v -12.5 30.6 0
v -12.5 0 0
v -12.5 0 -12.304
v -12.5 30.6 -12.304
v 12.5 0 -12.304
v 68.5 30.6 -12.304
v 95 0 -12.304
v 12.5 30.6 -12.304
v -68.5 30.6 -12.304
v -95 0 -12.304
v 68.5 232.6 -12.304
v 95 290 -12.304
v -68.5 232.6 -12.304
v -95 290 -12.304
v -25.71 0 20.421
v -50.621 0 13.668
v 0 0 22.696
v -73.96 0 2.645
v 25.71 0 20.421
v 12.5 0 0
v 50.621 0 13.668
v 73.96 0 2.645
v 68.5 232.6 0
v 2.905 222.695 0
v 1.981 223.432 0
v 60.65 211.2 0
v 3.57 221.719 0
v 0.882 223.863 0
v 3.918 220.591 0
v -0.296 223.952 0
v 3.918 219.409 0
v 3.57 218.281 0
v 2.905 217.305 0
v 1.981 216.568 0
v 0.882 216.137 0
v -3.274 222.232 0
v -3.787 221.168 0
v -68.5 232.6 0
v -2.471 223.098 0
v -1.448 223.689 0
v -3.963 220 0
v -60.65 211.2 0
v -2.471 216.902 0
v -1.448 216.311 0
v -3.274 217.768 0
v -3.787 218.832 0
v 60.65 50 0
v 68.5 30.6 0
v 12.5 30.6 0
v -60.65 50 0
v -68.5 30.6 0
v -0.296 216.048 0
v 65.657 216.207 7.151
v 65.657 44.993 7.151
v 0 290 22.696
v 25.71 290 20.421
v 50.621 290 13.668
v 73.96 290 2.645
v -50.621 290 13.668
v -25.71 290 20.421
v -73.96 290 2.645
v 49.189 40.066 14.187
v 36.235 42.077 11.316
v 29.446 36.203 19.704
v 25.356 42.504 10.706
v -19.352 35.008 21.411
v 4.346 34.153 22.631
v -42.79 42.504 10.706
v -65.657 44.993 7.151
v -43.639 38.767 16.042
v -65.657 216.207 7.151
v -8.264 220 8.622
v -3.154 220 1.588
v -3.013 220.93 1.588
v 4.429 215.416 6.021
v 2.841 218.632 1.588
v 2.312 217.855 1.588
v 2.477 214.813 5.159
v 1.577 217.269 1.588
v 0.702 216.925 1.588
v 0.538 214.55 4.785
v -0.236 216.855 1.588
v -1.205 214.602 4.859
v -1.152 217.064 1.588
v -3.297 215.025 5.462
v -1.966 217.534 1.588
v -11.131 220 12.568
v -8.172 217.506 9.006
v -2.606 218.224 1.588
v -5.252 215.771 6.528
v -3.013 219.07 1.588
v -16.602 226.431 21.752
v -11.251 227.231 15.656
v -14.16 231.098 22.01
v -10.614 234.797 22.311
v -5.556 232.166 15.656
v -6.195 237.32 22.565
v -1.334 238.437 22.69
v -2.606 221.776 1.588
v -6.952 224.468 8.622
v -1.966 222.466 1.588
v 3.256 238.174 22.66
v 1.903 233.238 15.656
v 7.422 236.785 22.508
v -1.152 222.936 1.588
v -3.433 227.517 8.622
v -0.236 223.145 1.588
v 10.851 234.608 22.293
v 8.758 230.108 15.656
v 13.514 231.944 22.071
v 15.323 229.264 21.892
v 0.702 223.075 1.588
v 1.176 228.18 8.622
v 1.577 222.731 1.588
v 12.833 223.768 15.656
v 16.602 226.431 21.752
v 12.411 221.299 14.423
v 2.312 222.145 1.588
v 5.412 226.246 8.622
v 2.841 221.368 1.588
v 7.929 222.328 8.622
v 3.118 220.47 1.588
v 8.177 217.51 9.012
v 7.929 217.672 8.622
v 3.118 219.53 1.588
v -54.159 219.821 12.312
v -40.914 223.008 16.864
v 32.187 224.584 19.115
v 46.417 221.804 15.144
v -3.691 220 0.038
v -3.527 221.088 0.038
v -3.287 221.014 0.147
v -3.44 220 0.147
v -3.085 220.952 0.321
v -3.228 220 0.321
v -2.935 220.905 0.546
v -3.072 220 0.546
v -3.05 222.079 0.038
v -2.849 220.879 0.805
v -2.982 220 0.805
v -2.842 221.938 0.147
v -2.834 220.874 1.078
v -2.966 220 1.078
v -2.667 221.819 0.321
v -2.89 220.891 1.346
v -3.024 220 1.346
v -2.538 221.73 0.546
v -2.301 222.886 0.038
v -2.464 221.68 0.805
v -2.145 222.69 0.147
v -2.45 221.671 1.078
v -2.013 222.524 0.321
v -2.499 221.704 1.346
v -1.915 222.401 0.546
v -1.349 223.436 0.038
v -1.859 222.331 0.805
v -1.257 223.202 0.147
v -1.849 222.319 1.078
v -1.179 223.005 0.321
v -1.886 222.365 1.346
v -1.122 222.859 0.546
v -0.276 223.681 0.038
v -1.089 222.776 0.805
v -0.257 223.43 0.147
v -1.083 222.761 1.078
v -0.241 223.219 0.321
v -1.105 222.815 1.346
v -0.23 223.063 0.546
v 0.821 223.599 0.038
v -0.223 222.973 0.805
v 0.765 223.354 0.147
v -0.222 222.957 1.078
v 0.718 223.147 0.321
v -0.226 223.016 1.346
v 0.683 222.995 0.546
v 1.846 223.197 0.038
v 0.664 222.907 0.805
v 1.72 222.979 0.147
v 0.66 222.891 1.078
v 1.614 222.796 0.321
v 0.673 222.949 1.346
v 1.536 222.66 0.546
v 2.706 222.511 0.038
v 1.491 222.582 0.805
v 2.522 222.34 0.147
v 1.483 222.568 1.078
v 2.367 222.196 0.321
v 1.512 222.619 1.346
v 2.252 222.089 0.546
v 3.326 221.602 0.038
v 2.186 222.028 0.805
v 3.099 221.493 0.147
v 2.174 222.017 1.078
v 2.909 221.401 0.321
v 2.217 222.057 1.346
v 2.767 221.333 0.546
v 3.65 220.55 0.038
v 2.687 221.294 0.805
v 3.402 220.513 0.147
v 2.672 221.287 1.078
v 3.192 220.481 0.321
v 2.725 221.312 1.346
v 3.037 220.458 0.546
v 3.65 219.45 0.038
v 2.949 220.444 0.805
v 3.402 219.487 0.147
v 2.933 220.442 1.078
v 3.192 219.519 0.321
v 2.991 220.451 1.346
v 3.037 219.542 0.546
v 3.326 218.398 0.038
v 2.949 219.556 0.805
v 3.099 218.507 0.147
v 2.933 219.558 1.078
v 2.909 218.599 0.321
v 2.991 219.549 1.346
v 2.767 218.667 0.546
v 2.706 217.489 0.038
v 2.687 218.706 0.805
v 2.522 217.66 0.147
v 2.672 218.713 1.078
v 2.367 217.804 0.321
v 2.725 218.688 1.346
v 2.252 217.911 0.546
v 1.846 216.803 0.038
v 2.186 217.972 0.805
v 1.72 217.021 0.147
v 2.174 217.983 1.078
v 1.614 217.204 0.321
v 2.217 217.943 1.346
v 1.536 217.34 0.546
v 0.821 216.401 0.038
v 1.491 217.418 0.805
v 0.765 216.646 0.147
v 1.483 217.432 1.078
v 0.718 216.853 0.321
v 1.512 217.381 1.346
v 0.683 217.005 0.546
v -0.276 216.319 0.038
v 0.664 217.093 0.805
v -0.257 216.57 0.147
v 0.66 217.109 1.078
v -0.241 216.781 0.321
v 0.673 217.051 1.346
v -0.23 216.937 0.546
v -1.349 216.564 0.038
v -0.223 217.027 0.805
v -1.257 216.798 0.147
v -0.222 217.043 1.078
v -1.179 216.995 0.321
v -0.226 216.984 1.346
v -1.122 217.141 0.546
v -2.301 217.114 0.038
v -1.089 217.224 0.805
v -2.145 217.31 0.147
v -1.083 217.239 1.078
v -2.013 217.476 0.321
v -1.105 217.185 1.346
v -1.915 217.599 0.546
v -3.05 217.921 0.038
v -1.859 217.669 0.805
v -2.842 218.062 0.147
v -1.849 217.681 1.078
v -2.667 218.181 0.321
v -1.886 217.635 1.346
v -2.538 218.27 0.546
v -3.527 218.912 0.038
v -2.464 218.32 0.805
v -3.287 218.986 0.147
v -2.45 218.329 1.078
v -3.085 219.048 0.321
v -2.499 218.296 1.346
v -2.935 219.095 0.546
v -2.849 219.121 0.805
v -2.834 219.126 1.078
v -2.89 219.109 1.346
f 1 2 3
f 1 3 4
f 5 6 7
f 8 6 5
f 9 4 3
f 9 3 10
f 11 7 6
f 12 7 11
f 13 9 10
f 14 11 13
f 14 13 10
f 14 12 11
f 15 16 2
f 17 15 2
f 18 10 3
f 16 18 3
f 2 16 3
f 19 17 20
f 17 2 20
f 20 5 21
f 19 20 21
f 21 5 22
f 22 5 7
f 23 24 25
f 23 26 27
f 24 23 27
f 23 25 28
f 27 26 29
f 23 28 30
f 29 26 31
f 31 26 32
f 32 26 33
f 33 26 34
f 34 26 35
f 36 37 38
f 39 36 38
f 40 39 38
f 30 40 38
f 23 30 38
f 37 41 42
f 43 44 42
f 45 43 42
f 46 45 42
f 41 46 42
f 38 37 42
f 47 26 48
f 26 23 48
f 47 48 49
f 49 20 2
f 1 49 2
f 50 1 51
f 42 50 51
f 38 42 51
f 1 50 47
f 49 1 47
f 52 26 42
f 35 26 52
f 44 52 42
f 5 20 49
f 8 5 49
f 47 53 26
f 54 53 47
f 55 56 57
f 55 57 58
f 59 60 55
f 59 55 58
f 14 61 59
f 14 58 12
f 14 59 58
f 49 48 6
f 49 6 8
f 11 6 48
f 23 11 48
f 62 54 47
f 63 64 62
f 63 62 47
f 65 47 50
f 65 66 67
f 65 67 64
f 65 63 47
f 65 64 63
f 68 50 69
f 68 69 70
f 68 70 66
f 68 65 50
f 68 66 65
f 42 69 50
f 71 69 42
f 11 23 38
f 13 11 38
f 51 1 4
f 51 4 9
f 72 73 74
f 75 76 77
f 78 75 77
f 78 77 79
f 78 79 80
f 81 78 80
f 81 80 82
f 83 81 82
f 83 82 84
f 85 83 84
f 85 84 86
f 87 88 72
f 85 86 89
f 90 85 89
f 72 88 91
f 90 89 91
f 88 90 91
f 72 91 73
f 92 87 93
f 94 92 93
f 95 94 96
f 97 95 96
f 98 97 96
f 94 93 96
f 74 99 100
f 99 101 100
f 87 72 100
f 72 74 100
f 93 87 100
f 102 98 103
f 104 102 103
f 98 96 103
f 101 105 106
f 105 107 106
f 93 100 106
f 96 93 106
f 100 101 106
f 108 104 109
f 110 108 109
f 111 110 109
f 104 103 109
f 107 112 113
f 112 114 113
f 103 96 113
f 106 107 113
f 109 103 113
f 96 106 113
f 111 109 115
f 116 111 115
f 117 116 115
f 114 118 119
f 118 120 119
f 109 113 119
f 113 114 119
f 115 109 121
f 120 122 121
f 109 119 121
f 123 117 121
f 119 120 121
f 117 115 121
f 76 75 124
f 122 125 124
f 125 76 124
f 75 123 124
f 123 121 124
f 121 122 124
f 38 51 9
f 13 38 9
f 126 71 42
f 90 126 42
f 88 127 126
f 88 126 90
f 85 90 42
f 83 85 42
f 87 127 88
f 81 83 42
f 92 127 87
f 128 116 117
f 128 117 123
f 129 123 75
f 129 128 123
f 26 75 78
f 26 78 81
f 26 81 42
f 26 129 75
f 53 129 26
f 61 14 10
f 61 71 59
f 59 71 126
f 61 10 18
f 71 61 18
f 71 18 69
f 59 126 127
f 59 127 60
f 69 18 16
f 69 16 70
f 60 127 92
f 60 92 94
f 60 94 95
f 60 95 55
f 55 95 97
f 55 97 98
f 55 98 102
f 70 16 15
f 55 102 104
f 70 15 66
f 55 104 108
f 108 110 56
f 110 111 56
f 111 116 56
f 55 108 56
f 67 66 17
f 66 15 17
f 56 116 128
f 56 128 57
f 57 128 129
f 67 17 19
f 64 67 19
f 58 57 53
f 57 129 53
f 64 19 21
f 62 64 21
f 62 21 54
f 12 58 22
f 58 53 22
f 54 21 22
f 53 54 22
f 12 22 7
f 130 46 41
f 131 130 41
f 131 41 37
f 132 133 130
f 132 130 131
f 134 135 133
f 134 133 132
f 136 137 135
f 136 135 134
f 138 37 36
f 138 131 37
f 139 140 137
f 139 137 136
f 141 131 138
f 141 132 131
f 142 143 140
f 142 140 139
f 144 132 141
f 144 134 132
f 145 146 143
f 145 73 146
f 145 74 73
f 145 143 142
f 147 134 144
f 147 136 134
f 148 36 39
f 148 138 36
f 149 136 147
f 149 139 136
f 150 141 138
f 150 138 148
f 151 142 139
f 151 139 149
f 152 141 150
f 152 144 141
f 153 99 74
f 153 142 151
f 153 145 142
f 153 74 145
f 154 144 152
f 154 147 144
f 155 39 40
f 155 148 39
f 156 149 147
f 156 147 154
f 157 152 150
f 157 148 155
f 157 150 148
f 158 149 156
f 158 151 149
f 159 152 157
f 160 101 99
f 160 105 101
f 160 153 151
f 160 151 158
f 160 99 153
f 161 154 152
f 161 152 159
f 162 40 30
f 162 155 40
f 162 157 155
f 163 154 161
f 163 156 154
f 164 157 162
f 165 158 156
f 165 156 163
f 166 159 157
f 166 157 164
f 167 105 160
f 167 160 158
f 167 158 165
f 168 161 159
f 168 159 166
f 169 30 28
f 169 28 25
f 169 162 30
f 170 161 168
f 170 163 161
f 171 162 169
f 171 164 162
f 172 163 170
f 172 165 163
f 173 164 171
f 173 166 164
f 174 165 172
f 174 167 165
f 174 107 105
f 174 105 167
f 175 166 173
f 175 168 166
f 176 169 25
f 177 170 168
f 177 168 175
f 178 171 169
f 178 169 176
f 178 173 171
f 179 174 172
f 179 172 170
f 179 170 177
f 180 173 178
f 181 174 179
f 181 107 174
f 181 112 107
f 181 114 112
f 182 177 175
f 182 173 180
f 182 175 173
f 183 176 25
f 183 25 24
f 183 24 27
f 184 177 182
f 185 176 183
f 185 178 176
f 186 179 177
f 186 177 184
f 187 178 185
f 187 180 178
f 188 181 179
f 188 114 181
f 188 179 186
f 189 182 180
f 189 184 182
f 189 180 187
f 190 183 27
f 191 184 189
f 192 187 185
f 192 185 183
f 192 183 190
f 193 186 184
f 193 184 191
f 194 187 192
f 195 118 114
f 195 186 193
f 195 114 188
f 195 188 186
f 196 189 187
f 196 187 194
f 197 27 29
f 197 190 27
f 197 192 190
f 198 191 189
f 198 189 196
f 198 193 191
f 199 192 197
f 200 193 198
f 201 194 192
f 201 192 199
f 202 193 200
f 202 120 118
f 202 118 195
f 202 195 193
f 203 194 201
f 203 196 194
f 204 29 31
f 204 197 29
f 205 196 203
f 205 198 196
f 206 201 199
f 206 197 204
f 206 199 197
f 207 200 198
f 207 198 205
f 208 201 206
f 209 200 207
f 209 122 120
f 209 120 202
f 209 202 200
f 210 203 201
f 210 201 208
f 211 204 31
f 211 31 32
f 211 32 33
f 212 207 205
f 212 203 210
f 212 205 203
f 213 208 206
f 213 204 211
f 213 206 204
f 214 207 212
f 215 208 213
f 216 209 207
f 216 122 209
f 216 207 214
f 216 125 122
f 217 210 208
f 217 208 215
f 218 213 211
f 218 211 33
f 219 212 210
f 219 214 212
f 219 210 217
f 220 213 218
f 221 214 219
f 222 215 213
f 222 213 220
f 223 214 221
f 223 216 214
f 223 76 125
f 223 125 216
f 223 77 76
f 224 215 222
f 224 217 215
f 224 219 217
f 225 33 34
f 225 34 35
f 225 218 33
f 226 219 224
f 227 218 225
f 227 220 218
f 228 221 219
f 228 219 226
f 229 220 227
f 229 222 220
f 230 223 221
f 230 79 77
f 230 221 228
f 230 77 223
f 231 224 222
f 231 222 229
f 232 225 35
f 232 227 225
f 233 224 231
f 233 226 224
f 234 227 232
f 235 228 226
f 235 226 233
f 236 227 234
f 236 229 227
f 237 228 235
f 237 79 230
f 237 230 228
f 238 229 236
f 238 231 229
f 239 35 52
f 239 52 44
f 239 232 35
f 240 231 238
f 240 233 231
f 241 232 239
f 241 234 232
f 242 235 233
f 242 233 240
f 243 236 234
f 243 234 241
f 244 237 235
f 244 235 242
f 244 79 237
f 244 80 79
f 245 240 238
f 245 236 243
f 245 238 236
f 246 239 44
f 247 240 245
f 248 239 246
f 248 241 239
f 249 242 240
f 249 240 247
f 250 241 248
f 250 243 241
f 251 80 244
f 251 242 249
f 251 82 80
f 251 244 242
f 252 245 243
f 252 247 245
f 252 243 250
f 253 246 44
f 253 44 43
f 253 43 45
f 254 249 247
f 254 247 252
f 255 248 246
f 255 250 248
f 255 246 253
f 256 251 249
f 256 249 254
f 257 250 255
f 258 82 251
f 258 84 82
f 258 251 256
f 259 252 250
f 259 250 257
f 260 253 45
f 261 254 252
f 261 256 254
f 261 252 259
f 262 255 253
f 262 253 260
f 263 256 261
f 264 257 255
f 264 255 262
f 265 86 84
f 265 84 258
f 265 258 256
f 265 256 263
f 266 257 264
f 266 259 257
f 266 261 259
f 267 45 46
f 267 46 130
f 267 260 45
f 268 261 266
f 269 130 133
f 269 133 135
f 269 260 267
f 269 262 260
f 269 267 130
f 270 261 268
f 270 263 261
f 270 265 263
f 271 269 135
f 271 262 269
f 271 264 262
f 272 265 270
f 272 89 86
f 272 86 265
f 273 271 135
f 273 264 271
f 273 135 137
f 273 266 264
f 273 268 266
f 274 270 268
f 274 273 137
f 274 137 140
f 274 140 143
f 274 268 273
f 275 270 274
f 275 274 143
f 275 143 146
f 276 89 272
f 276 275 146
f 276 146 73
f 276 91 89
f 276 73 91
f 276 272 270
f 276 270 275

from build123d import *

# Parameters (mm, degrees)
BOSS_EXTRUDE1_DEPTH = 290
SKETCH3_W           = 137
SKETCH3_H           = 57.4
SKETCH3_W_2         = 56
SKETCH3_H_2         = 30.6
BOSS_EXTRUDE2_DEPTH = 12.30416804
SKETCH3_3_W         = 121.3
SKETCH3_3_H         = 161.2
CUT_EXTRUDE1_DEPTH  = 307.006700561
CUT_EXTRUDE1_TAPER  = -35
SKETCH3_5_R         = 2
CUT_EXTRUDE2_DEPTH  = 307.006700694
CUT_EXTRUDE2_DRAFT  = 36
FILLET2_R           = 1


with BuildPart() as part:
    # Sketch1 → Boss-Extrude1 (new body)
    with BuildSketch(Plane(origin=(0, 0, 0), x_dir=(1, 0, 0), z_dir=(0, 1, 0))):
        with BuildLine():
            Line((0, 0), (-68.5, 0))
            Line((-68.5, 0), (-68.5, 7.5))
            Line((-68.5, 7.5), (-68.5, 12.30416804))
            Line((-68.5, 12.30416804), (-95, 12.30416804))
            ThreePointArc((-95, 12.30416804), (0, -22.69583196), (95, 12.30416804))
            Line((95, 12.30416804), (68.5, 12.30416804))
            Line((68.5, 12.30416804), (68.5, 7.5))
            Line((68.5, 7.5), (68.5, 0))
            Line((68.5, 0), (0, 0))
        make_face()
    extrude(amount=BOSS_EXTRUDE1_DEPTH)

    # Sketch3 → Boss-Extrude2 (add)
    with BuildSketch(Plane(origin=(0, 0, 0), x_dir=(-1, 0, 0), z_dir=(0, 0, -1))):
        with Locations((0, 261.3)):
            Rectangle(SKETCH3_W, SKETCH3_H)
        with Locations((-40.5, 15.3)):
            Rectangle(SKETCH3_W_2, SKETCH3_H_2)
        with Locations((40.5, 15.3)):
            Rectangle(SKETCH3_W_2, SKETCH3_H_2)
    extrude(amount=BOSS_EXTRUDE2_DEPTH)

    # Sketch3<3> → Cut-Extrude1 (cut, through all)
    with BuildSketch(Plane(origin=(0, 0, 0), x_dir=(-1, 0, 0), z_dir=(0, 0, -1))):
        with Locations((0, 130.6)):
            Rectangle(SKETCH3_3_W, SKETCH3_3_H)
    extrude(amount=-CUT_EXTRUDE1_DEPTH, taper=CUT_EXTRUDE1_TAPER, mode=Mode.SUBTRACT)


with BuildPart() as cut_extrude2_tool:
    # Sketch3<5> → Cut-Extrude2 (with draft: the straight prism first)
    with BuildSketch(Plane(origin=(0, 0, 0), x_dir=(-1, 0, 0), z_dir=(0, 0, -1))):
        with Locations((0, 220)):
            Circle(SKETCH3_5_R)
    extrude(amount=-CUT_EXTRUDE2_DEPTH)
    # Cut-Extrude2: the draft: its side faces are tilted about the plane it starts from
    cut_extrude2_sides = [cut_extrude2_tool.faces().sort_by_distance(p)[0] for p in [
        (2, 220, 153.503350347),
    ]]
    draft(cut_extrude2_sides, Plane(origin=(0, 0, 0), x_dir=(-1, 0, 0), z_dir=(0, 0, -1)), CUT_EXTRUDE2_DRAFT)


with BuildPart() as part_1:
    add(part.part)

    # Cut-Extrude2: cut by cut_extrude2_tool
    add(cut_extrude2_tool.part, mode=Mode.SUBTRACT)

    # Fillet2
    fillet2_edges = [part_1.edges().sort_by_distance(p)[0] for p in [
        (2, 220, 0),
    ]]
    fillet(fillet2_edges, radius=FILLET2_R)


solid = part_1.part
